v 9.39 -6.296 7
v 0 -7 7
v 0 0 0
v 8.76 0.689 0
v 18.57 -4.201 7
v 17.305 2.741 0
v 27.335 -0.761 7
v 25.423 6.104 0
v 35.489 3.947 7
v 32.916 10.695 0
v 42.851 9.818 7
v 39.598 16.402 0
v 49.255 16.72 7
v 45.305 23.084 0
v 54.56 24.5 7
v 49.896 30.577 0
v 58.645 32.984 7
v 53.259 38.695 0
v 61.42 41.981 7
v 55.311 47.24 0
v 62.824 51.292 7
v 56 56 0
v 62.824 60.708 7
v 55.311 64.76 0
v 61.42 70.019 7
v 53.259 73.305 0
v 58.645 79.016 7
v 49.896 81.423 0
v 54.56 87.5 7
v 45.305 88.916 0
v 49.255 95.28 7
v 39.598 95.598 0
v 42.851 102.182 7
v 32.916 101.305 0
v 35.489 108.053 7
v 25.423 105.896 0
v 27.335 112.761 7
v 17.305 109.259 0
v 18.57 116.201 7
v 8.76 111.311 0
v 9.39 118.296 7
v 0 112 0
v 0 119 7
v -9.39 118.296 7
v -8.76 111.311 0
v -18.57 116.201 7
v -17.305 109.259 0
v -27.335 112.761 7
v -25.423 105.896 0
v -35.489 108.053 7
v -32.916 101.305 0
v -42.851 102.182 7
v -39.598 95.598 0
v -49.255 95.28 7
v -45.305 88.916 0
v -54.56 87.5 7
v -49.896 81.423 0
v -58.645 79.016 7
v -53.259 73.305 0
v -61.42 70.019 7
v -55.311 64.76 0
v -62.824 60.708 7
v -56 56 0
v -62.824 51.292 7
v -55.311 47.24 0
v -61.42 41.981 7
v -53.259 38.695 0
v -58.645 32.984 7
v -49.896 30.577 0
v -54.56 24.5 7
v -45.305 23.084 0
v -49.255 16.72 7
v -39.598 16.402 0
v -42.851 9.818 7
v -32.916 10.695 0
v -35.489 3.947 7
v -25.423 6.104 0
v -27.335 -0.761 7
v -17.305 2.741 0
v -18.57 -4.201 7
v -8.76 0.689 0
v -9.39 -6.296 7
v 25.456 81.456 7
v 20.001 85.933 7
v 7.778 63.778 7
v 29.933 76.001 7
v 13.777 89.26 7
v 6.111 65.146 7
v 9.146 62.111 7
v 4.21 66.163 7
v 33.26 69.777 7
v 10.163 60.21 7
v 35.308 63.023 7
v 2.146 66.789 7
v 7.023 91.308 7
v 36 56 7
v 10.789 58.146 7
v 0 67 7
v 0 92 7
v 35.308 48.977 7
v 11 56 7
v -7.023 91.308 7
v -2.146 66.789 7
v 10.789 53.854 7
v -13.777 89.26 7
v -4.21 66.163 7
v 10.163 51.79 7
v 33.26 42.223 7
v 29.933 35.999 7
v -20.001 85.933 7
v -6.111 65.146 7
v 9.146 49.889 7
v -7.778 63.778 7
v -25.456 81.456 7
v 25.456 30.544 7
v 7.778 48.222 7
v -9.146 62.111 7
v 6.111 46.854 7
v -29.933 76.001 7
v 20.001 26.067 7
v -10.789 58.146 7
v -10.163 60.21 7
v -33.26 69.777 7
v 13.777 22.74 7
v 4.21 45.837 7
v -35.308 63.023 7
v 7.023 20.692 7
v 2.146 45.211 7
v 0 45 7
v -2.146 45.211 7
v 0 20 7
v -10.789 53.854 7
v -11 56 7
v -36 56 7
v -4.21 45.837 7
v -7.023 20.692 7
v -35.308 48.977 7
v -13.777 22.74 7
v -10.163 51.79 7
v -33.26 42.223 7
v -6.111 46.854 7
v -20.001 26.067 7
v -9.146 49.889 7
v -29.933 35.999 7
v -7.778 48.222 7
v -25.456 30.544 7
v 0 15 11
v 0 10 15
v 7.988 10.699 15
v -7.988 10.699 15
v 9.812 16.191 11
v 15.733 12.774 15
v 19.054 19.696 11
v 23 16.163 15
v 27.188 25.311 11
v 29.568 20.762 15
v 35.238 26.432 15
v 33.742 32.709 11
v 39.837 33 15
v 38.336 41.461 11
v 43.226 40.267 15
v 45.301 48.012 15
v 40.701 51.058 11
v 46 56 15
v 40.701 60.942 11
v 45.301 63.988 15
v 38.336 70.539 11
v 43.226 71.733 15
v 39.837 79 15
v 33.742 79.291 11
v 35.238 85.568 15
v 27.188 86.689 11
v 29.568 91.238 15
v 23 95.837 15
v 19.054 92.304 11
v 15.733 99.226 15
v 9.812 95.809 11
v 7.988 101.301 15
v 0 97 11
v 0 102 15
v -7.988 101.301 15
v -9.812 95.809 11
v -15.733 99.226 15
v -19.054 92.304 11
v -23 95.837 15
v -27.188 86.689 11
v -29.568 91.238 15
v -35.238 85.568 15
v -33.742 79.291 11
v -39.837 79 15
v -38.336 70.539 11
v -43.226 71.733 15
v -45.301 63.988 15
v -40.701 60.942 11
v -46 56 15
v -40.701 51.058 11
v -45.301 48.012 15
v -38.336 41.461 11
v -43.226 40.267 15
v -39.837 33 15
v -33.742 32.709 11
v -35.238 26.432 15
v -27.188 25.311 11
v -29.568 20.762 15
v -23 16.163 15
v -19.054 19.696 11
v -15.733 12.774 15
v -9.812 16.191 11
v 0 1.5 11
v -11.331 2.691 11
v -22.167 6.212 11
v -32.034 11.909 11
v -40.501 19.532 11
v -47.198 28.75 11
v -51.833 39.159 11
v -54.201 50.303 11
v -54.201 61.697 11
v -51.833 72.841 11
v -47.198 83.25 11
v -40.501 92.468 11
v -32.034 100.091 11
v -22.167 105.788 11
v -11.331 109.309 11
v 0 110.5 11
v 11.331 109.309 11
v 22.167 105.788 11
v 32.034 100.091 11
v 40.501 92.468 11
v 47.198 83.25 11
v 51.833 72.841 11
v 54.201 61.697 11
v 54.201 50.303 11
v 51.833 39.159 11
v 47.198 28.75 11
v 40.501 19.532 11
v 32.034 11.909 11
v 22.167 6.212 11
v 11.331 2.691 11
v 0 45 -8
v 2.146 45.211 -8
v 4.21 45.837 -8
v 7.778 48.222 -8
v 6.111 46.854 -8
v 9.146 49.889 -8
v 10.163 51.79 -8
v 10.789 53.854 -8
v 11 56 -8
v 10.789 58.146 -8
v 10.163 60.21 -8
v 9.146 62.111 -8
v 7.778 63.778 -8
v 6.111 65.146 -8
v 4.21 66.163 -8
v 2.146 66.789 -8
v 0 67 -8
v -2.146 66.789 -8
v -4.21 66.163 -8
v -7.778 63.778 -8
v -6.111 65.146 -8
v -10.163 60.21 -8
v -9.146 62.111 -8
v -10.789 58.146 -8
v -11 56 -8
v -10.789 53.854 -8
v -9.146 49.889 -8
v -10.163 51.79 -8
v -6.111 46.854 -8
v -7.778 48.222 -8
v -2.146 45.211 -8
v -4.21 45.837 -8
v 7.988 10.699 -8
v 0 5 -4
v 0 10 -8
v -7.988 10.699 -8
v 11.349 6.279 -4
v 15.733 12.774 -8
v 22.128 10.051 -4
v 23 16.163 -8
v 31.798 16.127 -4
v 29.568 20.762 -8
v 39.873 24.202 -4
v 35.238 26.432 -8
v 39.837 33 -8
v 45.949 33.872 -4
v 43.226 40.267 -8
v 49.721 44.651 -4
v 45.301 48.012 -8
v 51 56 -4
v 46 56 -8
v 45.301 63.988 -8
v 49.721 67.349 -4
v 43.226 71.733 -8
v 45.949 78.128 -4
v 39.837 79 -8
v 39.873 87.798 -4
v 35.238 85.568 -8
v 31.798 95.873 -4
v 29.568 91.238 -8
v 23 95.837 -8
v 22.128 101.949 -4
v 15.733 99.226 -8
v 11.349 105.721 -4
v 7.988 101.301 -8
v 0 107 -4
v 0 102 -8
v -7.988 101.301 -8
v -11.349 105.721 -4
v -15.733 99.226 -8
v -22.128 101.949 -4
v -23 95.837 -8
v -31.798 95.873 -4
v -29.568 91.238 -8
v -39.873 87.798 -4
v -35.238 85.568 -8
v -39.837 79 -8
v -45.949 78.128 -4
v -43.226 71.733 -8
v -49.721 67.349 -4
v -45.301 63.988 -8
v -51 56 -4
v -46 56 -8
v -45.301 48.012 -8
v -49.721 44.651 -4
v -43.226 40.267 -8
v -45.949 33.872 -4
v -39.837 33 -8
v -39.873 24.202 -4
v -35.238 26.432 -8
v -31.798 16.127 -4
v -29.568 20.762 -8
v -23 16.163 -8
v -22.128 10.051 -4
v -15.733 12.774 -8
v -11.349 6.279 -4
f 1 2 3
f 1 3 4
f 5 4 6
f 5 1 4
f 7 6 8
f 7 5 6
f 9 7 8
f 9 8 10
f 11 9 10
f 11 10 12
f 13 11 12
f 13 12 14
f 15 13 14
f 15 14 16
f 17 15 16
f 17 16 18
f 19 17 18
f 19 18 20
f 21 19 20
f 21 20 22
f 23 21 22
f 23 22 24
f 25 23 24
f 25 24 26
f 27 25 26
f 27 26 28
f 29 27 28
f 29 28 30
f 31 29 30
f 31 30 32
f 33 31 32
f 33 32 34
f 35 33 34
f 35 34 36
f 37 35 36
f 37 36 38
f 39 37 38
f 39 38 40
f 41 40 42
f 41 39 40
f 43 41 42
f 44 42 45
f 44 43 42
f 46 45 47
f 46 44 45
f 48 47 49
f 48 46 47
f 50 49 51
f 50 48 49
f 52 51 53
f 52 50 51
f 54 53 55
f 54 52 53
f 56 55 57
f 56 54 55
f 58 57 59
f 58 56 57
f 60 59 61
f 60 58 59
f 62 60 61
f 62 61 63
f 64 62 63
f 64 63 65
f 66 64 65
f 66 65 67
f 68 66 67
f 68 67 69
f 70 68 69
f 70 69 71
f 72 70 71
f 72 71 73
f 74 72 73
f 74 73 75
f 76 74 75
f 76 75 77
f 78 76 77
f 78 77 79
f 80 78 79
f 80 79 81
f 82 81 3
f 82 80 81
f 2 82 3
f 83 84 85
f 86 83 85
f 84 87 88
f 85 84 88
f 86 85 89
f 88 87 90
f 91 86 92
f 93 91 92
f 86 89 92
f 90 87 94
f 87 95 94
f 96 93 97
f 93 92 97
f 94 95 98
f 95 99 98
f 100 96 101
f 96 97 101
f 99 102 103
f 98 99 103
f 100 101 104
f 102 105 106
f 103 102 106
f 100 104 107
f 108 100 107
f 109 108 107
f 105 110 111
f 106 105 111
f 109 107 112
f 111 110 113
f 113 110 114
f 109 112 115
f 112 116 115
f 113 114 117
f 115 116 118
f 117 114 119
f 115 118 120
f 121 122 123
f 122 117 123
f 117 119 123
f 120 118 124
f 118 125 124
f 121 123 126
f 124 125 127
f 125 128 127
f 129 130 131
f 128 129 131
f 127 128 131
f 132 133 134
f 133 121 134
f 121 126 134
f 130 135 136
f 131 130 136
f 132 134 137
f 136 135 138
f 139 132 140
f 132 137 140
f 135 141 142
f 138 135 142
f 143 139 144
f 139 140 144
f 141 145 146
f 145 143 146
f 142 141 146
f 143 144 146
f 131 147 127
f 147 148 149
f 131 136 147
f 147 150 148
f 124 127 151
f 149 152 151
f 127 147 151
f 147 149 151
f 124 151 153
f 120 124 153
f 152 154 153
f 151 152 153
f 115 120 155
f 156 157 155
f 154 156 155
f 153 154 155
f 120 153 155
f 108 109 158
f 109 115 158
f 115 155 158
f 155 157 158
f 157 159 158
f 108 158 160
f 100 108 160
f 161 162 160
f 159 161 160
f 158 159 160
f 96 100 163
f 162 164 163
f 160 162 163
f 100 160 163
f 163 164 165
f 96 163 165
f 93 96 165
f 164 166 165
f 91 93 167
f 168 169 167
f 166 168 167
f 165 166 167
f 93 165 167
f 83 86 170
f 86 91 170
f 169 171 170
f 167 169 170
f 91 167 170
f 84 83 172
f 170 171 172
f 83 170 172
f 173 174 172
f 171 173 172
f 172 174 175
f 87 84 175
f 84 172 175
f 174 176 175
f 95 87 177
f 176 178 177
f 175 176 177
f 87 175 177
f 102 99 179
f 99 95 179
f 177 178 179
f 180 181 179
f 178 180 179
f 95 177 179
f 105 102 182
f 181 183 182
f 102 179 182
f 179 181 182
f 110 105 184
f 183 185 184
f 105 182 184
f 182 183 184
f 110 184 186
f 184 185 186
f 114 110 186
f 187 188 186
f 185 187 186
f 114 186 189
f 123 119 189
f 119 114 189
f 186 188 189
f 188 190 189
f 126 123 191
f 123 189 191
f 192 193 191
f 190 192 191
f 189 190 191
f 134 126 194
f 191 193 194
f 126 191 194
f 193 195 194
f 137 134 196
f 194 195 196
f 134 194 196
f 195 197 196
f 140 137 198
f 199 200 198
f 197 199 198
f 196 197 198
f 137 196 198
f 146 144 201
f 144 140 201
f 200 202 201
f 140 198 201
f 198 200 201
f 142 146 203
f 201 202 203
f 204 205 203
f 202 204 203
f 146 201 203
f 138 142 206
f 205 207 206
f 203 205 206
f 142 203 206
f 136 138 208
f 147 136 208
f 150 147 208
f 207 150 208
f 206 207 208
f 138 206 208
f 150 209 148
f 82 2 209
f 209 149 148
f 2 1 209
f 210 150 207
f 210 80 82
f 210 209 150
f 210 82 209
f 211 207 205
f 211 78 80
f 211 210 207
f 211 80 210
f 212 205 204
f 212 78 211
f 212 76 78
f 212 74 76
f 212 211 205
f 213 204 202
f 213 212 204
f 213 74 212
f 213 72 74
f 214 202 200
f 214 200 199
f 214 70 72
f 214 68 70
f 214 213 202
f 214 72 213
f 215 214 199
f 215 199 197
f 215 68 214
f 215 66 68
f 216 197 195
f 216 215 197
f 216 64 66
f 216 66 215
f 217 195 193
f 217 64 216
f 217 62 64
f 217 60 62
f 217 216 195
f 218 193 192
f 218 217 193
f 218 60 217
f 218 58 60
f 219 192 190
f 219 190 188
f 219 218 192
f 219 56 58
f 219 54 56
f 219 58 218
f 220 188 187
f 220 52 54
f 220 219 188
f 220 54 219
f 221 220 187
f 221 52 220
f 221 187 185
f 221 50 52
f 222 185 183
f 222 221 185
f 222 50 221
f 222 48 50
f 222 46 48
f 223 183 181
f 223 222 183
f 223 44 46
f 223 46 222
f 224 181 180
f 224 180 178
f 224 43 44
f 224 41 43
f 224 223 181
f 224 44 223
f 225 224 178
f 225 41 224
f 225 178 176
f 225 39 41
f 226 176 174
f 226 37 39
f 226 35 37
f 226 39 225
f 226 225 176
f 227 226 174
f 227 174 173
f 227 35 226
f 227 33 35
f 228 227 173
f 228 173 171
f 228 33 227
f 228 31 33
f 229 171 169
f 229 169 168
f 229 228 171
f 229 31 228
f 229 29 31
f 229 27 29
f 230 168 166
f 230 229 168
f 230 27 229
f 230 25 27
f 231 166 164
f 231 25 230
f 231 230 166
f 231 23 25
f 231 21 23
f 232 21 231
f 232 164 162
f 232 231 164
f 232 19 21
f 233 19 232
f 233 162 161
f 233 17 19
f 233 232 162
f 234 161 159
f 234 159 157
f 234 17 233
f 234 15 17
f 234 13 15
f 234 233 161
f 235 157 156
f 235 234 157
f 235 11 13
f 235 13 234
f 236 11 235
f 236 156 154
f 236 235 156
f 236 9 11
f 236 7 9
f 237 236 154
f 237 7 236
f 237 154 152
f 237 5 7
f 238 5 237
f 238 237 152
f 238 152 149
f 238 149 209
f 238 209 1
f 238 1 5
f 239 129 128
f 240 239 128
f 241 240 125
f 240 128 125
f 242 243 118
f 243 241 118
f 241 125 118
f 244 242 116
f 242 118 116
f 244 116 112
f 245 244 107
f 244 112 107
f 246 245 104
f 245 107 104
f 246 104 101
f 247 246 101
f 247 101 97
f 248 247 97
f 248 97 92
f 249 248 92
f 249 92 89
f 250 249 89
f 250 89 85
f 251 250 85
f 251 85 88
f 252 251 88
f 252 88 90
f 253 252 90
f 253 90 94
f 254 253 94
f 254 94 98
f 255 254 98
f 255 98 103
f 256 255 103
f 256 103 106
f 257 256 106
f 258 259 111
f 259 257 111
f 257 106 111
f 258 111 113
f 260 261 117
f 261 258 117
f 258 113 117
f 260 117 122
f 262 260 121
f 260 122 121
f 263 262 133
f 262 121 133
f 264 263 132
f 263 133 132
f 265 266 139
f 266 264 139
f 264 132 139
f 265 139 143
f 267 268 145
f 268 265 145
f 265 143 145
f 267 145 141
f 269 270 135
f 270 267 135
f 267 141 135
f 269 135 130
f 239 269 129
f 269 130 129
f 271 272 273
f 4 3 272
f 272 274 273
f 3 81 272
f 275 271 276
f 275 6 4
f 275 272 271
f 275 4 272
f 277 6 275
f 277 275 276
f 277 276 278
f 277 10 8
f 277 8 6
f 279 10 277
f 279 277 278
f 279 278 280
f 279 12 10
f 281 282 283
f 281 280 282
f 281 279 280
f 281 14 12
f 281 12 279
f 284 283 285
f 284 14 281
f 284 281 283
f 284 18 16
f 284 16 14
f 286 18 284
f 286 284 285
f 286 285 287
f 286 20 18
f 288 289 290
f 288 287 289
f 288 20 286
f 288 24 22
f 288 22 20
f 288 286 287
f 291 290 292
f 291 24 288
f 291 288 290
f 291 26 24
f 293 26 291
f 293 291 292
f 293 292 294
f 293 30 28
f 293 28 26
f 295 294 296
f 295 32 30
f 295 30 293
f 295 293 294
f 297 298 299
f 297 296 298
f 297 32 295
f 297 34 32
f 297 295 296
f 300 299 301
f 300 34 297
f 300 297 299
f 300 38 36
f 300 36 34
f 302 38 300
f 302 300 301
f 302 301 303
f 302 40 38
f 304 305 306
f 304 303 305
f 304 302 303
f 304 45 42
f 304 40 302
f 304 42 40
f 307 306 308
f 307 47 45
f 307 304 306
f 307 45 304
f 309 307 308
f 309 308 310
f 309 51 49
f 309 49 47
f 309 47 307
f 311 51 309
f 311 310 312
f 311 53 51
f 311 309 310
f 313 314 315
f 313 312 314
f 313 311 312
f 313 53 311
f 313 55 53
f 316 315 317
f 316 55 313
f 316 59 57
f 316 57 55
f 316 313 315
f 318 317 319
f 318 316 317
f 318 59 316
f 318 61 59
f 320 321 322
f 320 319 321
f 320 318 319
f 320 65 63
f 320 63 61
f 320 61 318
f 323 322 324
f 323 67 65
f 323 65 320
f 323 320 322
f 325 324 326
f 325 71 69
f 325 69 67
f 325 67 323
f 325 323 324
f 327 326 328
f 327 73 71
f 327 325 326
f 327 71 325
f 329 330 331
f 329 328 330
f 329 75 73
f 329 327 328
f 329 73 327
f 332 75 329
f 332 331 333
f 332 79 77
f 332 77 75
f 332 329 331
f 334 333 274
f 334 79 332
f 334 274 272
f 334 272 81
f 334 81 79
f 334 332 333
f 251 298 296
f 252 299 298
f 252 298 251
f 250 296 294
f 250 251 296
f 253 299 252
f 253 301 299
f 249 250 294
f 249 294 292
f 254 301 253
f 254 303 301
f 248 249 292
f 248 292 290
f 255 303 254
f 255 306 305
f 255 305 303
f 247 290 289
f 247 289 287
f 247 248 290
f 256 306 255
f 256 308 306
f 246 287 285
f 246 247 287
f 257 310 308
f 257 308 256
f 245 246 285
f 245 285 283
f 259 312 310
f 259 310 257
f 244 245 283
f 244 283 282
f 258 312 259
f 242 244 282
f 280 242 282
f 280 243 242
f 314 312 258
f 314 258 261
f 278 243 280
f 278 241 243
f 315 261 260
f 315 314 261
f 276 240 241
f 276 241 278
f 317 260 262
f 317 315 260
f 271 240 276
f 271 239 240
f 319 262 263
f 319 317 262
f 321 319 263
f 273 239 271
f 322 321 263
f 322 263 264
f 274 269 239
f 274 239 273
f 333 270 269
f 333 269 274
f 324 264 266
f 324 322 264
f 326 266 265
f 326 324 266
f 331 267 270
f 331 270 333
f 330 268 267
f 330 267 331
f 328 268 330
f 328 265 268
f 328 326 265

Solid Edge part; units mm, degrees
sketch "Sketch1" plane through (0, 0, 0) normal (1, 0, 0) x (0, 1, 0)
  line L0 (10, -8) -> (45, -8)
  line L1 (45, -8) -> (45, 7)
  line L2 (45, 7) -> (20, 7)
  line L3 (20, 7) -> (10, 15)
  line L4 (10, 15) -> (-7, 7)
  line L5 (0, 0) -> (-7, 7)
  line L6 (0, 0) -> (10, -8)
  dimension "D1" = 10
  dimension "D2" = 35
  dimension "D3" = 56
  dimension "D4" = 15
  dimension "D5" = 8
  dimension "D6" = 25
  dimension "D7" = 10
  dimension "D8" = 8
  dimension "D9" = 17
  dimension "D10" = 8
revolve "RevolvedProtrusion1" add sketch "Sketch1" angle 360 about axis through (0, 56, 17.8505) along (0, 0, -1)
properties material "Steel"
